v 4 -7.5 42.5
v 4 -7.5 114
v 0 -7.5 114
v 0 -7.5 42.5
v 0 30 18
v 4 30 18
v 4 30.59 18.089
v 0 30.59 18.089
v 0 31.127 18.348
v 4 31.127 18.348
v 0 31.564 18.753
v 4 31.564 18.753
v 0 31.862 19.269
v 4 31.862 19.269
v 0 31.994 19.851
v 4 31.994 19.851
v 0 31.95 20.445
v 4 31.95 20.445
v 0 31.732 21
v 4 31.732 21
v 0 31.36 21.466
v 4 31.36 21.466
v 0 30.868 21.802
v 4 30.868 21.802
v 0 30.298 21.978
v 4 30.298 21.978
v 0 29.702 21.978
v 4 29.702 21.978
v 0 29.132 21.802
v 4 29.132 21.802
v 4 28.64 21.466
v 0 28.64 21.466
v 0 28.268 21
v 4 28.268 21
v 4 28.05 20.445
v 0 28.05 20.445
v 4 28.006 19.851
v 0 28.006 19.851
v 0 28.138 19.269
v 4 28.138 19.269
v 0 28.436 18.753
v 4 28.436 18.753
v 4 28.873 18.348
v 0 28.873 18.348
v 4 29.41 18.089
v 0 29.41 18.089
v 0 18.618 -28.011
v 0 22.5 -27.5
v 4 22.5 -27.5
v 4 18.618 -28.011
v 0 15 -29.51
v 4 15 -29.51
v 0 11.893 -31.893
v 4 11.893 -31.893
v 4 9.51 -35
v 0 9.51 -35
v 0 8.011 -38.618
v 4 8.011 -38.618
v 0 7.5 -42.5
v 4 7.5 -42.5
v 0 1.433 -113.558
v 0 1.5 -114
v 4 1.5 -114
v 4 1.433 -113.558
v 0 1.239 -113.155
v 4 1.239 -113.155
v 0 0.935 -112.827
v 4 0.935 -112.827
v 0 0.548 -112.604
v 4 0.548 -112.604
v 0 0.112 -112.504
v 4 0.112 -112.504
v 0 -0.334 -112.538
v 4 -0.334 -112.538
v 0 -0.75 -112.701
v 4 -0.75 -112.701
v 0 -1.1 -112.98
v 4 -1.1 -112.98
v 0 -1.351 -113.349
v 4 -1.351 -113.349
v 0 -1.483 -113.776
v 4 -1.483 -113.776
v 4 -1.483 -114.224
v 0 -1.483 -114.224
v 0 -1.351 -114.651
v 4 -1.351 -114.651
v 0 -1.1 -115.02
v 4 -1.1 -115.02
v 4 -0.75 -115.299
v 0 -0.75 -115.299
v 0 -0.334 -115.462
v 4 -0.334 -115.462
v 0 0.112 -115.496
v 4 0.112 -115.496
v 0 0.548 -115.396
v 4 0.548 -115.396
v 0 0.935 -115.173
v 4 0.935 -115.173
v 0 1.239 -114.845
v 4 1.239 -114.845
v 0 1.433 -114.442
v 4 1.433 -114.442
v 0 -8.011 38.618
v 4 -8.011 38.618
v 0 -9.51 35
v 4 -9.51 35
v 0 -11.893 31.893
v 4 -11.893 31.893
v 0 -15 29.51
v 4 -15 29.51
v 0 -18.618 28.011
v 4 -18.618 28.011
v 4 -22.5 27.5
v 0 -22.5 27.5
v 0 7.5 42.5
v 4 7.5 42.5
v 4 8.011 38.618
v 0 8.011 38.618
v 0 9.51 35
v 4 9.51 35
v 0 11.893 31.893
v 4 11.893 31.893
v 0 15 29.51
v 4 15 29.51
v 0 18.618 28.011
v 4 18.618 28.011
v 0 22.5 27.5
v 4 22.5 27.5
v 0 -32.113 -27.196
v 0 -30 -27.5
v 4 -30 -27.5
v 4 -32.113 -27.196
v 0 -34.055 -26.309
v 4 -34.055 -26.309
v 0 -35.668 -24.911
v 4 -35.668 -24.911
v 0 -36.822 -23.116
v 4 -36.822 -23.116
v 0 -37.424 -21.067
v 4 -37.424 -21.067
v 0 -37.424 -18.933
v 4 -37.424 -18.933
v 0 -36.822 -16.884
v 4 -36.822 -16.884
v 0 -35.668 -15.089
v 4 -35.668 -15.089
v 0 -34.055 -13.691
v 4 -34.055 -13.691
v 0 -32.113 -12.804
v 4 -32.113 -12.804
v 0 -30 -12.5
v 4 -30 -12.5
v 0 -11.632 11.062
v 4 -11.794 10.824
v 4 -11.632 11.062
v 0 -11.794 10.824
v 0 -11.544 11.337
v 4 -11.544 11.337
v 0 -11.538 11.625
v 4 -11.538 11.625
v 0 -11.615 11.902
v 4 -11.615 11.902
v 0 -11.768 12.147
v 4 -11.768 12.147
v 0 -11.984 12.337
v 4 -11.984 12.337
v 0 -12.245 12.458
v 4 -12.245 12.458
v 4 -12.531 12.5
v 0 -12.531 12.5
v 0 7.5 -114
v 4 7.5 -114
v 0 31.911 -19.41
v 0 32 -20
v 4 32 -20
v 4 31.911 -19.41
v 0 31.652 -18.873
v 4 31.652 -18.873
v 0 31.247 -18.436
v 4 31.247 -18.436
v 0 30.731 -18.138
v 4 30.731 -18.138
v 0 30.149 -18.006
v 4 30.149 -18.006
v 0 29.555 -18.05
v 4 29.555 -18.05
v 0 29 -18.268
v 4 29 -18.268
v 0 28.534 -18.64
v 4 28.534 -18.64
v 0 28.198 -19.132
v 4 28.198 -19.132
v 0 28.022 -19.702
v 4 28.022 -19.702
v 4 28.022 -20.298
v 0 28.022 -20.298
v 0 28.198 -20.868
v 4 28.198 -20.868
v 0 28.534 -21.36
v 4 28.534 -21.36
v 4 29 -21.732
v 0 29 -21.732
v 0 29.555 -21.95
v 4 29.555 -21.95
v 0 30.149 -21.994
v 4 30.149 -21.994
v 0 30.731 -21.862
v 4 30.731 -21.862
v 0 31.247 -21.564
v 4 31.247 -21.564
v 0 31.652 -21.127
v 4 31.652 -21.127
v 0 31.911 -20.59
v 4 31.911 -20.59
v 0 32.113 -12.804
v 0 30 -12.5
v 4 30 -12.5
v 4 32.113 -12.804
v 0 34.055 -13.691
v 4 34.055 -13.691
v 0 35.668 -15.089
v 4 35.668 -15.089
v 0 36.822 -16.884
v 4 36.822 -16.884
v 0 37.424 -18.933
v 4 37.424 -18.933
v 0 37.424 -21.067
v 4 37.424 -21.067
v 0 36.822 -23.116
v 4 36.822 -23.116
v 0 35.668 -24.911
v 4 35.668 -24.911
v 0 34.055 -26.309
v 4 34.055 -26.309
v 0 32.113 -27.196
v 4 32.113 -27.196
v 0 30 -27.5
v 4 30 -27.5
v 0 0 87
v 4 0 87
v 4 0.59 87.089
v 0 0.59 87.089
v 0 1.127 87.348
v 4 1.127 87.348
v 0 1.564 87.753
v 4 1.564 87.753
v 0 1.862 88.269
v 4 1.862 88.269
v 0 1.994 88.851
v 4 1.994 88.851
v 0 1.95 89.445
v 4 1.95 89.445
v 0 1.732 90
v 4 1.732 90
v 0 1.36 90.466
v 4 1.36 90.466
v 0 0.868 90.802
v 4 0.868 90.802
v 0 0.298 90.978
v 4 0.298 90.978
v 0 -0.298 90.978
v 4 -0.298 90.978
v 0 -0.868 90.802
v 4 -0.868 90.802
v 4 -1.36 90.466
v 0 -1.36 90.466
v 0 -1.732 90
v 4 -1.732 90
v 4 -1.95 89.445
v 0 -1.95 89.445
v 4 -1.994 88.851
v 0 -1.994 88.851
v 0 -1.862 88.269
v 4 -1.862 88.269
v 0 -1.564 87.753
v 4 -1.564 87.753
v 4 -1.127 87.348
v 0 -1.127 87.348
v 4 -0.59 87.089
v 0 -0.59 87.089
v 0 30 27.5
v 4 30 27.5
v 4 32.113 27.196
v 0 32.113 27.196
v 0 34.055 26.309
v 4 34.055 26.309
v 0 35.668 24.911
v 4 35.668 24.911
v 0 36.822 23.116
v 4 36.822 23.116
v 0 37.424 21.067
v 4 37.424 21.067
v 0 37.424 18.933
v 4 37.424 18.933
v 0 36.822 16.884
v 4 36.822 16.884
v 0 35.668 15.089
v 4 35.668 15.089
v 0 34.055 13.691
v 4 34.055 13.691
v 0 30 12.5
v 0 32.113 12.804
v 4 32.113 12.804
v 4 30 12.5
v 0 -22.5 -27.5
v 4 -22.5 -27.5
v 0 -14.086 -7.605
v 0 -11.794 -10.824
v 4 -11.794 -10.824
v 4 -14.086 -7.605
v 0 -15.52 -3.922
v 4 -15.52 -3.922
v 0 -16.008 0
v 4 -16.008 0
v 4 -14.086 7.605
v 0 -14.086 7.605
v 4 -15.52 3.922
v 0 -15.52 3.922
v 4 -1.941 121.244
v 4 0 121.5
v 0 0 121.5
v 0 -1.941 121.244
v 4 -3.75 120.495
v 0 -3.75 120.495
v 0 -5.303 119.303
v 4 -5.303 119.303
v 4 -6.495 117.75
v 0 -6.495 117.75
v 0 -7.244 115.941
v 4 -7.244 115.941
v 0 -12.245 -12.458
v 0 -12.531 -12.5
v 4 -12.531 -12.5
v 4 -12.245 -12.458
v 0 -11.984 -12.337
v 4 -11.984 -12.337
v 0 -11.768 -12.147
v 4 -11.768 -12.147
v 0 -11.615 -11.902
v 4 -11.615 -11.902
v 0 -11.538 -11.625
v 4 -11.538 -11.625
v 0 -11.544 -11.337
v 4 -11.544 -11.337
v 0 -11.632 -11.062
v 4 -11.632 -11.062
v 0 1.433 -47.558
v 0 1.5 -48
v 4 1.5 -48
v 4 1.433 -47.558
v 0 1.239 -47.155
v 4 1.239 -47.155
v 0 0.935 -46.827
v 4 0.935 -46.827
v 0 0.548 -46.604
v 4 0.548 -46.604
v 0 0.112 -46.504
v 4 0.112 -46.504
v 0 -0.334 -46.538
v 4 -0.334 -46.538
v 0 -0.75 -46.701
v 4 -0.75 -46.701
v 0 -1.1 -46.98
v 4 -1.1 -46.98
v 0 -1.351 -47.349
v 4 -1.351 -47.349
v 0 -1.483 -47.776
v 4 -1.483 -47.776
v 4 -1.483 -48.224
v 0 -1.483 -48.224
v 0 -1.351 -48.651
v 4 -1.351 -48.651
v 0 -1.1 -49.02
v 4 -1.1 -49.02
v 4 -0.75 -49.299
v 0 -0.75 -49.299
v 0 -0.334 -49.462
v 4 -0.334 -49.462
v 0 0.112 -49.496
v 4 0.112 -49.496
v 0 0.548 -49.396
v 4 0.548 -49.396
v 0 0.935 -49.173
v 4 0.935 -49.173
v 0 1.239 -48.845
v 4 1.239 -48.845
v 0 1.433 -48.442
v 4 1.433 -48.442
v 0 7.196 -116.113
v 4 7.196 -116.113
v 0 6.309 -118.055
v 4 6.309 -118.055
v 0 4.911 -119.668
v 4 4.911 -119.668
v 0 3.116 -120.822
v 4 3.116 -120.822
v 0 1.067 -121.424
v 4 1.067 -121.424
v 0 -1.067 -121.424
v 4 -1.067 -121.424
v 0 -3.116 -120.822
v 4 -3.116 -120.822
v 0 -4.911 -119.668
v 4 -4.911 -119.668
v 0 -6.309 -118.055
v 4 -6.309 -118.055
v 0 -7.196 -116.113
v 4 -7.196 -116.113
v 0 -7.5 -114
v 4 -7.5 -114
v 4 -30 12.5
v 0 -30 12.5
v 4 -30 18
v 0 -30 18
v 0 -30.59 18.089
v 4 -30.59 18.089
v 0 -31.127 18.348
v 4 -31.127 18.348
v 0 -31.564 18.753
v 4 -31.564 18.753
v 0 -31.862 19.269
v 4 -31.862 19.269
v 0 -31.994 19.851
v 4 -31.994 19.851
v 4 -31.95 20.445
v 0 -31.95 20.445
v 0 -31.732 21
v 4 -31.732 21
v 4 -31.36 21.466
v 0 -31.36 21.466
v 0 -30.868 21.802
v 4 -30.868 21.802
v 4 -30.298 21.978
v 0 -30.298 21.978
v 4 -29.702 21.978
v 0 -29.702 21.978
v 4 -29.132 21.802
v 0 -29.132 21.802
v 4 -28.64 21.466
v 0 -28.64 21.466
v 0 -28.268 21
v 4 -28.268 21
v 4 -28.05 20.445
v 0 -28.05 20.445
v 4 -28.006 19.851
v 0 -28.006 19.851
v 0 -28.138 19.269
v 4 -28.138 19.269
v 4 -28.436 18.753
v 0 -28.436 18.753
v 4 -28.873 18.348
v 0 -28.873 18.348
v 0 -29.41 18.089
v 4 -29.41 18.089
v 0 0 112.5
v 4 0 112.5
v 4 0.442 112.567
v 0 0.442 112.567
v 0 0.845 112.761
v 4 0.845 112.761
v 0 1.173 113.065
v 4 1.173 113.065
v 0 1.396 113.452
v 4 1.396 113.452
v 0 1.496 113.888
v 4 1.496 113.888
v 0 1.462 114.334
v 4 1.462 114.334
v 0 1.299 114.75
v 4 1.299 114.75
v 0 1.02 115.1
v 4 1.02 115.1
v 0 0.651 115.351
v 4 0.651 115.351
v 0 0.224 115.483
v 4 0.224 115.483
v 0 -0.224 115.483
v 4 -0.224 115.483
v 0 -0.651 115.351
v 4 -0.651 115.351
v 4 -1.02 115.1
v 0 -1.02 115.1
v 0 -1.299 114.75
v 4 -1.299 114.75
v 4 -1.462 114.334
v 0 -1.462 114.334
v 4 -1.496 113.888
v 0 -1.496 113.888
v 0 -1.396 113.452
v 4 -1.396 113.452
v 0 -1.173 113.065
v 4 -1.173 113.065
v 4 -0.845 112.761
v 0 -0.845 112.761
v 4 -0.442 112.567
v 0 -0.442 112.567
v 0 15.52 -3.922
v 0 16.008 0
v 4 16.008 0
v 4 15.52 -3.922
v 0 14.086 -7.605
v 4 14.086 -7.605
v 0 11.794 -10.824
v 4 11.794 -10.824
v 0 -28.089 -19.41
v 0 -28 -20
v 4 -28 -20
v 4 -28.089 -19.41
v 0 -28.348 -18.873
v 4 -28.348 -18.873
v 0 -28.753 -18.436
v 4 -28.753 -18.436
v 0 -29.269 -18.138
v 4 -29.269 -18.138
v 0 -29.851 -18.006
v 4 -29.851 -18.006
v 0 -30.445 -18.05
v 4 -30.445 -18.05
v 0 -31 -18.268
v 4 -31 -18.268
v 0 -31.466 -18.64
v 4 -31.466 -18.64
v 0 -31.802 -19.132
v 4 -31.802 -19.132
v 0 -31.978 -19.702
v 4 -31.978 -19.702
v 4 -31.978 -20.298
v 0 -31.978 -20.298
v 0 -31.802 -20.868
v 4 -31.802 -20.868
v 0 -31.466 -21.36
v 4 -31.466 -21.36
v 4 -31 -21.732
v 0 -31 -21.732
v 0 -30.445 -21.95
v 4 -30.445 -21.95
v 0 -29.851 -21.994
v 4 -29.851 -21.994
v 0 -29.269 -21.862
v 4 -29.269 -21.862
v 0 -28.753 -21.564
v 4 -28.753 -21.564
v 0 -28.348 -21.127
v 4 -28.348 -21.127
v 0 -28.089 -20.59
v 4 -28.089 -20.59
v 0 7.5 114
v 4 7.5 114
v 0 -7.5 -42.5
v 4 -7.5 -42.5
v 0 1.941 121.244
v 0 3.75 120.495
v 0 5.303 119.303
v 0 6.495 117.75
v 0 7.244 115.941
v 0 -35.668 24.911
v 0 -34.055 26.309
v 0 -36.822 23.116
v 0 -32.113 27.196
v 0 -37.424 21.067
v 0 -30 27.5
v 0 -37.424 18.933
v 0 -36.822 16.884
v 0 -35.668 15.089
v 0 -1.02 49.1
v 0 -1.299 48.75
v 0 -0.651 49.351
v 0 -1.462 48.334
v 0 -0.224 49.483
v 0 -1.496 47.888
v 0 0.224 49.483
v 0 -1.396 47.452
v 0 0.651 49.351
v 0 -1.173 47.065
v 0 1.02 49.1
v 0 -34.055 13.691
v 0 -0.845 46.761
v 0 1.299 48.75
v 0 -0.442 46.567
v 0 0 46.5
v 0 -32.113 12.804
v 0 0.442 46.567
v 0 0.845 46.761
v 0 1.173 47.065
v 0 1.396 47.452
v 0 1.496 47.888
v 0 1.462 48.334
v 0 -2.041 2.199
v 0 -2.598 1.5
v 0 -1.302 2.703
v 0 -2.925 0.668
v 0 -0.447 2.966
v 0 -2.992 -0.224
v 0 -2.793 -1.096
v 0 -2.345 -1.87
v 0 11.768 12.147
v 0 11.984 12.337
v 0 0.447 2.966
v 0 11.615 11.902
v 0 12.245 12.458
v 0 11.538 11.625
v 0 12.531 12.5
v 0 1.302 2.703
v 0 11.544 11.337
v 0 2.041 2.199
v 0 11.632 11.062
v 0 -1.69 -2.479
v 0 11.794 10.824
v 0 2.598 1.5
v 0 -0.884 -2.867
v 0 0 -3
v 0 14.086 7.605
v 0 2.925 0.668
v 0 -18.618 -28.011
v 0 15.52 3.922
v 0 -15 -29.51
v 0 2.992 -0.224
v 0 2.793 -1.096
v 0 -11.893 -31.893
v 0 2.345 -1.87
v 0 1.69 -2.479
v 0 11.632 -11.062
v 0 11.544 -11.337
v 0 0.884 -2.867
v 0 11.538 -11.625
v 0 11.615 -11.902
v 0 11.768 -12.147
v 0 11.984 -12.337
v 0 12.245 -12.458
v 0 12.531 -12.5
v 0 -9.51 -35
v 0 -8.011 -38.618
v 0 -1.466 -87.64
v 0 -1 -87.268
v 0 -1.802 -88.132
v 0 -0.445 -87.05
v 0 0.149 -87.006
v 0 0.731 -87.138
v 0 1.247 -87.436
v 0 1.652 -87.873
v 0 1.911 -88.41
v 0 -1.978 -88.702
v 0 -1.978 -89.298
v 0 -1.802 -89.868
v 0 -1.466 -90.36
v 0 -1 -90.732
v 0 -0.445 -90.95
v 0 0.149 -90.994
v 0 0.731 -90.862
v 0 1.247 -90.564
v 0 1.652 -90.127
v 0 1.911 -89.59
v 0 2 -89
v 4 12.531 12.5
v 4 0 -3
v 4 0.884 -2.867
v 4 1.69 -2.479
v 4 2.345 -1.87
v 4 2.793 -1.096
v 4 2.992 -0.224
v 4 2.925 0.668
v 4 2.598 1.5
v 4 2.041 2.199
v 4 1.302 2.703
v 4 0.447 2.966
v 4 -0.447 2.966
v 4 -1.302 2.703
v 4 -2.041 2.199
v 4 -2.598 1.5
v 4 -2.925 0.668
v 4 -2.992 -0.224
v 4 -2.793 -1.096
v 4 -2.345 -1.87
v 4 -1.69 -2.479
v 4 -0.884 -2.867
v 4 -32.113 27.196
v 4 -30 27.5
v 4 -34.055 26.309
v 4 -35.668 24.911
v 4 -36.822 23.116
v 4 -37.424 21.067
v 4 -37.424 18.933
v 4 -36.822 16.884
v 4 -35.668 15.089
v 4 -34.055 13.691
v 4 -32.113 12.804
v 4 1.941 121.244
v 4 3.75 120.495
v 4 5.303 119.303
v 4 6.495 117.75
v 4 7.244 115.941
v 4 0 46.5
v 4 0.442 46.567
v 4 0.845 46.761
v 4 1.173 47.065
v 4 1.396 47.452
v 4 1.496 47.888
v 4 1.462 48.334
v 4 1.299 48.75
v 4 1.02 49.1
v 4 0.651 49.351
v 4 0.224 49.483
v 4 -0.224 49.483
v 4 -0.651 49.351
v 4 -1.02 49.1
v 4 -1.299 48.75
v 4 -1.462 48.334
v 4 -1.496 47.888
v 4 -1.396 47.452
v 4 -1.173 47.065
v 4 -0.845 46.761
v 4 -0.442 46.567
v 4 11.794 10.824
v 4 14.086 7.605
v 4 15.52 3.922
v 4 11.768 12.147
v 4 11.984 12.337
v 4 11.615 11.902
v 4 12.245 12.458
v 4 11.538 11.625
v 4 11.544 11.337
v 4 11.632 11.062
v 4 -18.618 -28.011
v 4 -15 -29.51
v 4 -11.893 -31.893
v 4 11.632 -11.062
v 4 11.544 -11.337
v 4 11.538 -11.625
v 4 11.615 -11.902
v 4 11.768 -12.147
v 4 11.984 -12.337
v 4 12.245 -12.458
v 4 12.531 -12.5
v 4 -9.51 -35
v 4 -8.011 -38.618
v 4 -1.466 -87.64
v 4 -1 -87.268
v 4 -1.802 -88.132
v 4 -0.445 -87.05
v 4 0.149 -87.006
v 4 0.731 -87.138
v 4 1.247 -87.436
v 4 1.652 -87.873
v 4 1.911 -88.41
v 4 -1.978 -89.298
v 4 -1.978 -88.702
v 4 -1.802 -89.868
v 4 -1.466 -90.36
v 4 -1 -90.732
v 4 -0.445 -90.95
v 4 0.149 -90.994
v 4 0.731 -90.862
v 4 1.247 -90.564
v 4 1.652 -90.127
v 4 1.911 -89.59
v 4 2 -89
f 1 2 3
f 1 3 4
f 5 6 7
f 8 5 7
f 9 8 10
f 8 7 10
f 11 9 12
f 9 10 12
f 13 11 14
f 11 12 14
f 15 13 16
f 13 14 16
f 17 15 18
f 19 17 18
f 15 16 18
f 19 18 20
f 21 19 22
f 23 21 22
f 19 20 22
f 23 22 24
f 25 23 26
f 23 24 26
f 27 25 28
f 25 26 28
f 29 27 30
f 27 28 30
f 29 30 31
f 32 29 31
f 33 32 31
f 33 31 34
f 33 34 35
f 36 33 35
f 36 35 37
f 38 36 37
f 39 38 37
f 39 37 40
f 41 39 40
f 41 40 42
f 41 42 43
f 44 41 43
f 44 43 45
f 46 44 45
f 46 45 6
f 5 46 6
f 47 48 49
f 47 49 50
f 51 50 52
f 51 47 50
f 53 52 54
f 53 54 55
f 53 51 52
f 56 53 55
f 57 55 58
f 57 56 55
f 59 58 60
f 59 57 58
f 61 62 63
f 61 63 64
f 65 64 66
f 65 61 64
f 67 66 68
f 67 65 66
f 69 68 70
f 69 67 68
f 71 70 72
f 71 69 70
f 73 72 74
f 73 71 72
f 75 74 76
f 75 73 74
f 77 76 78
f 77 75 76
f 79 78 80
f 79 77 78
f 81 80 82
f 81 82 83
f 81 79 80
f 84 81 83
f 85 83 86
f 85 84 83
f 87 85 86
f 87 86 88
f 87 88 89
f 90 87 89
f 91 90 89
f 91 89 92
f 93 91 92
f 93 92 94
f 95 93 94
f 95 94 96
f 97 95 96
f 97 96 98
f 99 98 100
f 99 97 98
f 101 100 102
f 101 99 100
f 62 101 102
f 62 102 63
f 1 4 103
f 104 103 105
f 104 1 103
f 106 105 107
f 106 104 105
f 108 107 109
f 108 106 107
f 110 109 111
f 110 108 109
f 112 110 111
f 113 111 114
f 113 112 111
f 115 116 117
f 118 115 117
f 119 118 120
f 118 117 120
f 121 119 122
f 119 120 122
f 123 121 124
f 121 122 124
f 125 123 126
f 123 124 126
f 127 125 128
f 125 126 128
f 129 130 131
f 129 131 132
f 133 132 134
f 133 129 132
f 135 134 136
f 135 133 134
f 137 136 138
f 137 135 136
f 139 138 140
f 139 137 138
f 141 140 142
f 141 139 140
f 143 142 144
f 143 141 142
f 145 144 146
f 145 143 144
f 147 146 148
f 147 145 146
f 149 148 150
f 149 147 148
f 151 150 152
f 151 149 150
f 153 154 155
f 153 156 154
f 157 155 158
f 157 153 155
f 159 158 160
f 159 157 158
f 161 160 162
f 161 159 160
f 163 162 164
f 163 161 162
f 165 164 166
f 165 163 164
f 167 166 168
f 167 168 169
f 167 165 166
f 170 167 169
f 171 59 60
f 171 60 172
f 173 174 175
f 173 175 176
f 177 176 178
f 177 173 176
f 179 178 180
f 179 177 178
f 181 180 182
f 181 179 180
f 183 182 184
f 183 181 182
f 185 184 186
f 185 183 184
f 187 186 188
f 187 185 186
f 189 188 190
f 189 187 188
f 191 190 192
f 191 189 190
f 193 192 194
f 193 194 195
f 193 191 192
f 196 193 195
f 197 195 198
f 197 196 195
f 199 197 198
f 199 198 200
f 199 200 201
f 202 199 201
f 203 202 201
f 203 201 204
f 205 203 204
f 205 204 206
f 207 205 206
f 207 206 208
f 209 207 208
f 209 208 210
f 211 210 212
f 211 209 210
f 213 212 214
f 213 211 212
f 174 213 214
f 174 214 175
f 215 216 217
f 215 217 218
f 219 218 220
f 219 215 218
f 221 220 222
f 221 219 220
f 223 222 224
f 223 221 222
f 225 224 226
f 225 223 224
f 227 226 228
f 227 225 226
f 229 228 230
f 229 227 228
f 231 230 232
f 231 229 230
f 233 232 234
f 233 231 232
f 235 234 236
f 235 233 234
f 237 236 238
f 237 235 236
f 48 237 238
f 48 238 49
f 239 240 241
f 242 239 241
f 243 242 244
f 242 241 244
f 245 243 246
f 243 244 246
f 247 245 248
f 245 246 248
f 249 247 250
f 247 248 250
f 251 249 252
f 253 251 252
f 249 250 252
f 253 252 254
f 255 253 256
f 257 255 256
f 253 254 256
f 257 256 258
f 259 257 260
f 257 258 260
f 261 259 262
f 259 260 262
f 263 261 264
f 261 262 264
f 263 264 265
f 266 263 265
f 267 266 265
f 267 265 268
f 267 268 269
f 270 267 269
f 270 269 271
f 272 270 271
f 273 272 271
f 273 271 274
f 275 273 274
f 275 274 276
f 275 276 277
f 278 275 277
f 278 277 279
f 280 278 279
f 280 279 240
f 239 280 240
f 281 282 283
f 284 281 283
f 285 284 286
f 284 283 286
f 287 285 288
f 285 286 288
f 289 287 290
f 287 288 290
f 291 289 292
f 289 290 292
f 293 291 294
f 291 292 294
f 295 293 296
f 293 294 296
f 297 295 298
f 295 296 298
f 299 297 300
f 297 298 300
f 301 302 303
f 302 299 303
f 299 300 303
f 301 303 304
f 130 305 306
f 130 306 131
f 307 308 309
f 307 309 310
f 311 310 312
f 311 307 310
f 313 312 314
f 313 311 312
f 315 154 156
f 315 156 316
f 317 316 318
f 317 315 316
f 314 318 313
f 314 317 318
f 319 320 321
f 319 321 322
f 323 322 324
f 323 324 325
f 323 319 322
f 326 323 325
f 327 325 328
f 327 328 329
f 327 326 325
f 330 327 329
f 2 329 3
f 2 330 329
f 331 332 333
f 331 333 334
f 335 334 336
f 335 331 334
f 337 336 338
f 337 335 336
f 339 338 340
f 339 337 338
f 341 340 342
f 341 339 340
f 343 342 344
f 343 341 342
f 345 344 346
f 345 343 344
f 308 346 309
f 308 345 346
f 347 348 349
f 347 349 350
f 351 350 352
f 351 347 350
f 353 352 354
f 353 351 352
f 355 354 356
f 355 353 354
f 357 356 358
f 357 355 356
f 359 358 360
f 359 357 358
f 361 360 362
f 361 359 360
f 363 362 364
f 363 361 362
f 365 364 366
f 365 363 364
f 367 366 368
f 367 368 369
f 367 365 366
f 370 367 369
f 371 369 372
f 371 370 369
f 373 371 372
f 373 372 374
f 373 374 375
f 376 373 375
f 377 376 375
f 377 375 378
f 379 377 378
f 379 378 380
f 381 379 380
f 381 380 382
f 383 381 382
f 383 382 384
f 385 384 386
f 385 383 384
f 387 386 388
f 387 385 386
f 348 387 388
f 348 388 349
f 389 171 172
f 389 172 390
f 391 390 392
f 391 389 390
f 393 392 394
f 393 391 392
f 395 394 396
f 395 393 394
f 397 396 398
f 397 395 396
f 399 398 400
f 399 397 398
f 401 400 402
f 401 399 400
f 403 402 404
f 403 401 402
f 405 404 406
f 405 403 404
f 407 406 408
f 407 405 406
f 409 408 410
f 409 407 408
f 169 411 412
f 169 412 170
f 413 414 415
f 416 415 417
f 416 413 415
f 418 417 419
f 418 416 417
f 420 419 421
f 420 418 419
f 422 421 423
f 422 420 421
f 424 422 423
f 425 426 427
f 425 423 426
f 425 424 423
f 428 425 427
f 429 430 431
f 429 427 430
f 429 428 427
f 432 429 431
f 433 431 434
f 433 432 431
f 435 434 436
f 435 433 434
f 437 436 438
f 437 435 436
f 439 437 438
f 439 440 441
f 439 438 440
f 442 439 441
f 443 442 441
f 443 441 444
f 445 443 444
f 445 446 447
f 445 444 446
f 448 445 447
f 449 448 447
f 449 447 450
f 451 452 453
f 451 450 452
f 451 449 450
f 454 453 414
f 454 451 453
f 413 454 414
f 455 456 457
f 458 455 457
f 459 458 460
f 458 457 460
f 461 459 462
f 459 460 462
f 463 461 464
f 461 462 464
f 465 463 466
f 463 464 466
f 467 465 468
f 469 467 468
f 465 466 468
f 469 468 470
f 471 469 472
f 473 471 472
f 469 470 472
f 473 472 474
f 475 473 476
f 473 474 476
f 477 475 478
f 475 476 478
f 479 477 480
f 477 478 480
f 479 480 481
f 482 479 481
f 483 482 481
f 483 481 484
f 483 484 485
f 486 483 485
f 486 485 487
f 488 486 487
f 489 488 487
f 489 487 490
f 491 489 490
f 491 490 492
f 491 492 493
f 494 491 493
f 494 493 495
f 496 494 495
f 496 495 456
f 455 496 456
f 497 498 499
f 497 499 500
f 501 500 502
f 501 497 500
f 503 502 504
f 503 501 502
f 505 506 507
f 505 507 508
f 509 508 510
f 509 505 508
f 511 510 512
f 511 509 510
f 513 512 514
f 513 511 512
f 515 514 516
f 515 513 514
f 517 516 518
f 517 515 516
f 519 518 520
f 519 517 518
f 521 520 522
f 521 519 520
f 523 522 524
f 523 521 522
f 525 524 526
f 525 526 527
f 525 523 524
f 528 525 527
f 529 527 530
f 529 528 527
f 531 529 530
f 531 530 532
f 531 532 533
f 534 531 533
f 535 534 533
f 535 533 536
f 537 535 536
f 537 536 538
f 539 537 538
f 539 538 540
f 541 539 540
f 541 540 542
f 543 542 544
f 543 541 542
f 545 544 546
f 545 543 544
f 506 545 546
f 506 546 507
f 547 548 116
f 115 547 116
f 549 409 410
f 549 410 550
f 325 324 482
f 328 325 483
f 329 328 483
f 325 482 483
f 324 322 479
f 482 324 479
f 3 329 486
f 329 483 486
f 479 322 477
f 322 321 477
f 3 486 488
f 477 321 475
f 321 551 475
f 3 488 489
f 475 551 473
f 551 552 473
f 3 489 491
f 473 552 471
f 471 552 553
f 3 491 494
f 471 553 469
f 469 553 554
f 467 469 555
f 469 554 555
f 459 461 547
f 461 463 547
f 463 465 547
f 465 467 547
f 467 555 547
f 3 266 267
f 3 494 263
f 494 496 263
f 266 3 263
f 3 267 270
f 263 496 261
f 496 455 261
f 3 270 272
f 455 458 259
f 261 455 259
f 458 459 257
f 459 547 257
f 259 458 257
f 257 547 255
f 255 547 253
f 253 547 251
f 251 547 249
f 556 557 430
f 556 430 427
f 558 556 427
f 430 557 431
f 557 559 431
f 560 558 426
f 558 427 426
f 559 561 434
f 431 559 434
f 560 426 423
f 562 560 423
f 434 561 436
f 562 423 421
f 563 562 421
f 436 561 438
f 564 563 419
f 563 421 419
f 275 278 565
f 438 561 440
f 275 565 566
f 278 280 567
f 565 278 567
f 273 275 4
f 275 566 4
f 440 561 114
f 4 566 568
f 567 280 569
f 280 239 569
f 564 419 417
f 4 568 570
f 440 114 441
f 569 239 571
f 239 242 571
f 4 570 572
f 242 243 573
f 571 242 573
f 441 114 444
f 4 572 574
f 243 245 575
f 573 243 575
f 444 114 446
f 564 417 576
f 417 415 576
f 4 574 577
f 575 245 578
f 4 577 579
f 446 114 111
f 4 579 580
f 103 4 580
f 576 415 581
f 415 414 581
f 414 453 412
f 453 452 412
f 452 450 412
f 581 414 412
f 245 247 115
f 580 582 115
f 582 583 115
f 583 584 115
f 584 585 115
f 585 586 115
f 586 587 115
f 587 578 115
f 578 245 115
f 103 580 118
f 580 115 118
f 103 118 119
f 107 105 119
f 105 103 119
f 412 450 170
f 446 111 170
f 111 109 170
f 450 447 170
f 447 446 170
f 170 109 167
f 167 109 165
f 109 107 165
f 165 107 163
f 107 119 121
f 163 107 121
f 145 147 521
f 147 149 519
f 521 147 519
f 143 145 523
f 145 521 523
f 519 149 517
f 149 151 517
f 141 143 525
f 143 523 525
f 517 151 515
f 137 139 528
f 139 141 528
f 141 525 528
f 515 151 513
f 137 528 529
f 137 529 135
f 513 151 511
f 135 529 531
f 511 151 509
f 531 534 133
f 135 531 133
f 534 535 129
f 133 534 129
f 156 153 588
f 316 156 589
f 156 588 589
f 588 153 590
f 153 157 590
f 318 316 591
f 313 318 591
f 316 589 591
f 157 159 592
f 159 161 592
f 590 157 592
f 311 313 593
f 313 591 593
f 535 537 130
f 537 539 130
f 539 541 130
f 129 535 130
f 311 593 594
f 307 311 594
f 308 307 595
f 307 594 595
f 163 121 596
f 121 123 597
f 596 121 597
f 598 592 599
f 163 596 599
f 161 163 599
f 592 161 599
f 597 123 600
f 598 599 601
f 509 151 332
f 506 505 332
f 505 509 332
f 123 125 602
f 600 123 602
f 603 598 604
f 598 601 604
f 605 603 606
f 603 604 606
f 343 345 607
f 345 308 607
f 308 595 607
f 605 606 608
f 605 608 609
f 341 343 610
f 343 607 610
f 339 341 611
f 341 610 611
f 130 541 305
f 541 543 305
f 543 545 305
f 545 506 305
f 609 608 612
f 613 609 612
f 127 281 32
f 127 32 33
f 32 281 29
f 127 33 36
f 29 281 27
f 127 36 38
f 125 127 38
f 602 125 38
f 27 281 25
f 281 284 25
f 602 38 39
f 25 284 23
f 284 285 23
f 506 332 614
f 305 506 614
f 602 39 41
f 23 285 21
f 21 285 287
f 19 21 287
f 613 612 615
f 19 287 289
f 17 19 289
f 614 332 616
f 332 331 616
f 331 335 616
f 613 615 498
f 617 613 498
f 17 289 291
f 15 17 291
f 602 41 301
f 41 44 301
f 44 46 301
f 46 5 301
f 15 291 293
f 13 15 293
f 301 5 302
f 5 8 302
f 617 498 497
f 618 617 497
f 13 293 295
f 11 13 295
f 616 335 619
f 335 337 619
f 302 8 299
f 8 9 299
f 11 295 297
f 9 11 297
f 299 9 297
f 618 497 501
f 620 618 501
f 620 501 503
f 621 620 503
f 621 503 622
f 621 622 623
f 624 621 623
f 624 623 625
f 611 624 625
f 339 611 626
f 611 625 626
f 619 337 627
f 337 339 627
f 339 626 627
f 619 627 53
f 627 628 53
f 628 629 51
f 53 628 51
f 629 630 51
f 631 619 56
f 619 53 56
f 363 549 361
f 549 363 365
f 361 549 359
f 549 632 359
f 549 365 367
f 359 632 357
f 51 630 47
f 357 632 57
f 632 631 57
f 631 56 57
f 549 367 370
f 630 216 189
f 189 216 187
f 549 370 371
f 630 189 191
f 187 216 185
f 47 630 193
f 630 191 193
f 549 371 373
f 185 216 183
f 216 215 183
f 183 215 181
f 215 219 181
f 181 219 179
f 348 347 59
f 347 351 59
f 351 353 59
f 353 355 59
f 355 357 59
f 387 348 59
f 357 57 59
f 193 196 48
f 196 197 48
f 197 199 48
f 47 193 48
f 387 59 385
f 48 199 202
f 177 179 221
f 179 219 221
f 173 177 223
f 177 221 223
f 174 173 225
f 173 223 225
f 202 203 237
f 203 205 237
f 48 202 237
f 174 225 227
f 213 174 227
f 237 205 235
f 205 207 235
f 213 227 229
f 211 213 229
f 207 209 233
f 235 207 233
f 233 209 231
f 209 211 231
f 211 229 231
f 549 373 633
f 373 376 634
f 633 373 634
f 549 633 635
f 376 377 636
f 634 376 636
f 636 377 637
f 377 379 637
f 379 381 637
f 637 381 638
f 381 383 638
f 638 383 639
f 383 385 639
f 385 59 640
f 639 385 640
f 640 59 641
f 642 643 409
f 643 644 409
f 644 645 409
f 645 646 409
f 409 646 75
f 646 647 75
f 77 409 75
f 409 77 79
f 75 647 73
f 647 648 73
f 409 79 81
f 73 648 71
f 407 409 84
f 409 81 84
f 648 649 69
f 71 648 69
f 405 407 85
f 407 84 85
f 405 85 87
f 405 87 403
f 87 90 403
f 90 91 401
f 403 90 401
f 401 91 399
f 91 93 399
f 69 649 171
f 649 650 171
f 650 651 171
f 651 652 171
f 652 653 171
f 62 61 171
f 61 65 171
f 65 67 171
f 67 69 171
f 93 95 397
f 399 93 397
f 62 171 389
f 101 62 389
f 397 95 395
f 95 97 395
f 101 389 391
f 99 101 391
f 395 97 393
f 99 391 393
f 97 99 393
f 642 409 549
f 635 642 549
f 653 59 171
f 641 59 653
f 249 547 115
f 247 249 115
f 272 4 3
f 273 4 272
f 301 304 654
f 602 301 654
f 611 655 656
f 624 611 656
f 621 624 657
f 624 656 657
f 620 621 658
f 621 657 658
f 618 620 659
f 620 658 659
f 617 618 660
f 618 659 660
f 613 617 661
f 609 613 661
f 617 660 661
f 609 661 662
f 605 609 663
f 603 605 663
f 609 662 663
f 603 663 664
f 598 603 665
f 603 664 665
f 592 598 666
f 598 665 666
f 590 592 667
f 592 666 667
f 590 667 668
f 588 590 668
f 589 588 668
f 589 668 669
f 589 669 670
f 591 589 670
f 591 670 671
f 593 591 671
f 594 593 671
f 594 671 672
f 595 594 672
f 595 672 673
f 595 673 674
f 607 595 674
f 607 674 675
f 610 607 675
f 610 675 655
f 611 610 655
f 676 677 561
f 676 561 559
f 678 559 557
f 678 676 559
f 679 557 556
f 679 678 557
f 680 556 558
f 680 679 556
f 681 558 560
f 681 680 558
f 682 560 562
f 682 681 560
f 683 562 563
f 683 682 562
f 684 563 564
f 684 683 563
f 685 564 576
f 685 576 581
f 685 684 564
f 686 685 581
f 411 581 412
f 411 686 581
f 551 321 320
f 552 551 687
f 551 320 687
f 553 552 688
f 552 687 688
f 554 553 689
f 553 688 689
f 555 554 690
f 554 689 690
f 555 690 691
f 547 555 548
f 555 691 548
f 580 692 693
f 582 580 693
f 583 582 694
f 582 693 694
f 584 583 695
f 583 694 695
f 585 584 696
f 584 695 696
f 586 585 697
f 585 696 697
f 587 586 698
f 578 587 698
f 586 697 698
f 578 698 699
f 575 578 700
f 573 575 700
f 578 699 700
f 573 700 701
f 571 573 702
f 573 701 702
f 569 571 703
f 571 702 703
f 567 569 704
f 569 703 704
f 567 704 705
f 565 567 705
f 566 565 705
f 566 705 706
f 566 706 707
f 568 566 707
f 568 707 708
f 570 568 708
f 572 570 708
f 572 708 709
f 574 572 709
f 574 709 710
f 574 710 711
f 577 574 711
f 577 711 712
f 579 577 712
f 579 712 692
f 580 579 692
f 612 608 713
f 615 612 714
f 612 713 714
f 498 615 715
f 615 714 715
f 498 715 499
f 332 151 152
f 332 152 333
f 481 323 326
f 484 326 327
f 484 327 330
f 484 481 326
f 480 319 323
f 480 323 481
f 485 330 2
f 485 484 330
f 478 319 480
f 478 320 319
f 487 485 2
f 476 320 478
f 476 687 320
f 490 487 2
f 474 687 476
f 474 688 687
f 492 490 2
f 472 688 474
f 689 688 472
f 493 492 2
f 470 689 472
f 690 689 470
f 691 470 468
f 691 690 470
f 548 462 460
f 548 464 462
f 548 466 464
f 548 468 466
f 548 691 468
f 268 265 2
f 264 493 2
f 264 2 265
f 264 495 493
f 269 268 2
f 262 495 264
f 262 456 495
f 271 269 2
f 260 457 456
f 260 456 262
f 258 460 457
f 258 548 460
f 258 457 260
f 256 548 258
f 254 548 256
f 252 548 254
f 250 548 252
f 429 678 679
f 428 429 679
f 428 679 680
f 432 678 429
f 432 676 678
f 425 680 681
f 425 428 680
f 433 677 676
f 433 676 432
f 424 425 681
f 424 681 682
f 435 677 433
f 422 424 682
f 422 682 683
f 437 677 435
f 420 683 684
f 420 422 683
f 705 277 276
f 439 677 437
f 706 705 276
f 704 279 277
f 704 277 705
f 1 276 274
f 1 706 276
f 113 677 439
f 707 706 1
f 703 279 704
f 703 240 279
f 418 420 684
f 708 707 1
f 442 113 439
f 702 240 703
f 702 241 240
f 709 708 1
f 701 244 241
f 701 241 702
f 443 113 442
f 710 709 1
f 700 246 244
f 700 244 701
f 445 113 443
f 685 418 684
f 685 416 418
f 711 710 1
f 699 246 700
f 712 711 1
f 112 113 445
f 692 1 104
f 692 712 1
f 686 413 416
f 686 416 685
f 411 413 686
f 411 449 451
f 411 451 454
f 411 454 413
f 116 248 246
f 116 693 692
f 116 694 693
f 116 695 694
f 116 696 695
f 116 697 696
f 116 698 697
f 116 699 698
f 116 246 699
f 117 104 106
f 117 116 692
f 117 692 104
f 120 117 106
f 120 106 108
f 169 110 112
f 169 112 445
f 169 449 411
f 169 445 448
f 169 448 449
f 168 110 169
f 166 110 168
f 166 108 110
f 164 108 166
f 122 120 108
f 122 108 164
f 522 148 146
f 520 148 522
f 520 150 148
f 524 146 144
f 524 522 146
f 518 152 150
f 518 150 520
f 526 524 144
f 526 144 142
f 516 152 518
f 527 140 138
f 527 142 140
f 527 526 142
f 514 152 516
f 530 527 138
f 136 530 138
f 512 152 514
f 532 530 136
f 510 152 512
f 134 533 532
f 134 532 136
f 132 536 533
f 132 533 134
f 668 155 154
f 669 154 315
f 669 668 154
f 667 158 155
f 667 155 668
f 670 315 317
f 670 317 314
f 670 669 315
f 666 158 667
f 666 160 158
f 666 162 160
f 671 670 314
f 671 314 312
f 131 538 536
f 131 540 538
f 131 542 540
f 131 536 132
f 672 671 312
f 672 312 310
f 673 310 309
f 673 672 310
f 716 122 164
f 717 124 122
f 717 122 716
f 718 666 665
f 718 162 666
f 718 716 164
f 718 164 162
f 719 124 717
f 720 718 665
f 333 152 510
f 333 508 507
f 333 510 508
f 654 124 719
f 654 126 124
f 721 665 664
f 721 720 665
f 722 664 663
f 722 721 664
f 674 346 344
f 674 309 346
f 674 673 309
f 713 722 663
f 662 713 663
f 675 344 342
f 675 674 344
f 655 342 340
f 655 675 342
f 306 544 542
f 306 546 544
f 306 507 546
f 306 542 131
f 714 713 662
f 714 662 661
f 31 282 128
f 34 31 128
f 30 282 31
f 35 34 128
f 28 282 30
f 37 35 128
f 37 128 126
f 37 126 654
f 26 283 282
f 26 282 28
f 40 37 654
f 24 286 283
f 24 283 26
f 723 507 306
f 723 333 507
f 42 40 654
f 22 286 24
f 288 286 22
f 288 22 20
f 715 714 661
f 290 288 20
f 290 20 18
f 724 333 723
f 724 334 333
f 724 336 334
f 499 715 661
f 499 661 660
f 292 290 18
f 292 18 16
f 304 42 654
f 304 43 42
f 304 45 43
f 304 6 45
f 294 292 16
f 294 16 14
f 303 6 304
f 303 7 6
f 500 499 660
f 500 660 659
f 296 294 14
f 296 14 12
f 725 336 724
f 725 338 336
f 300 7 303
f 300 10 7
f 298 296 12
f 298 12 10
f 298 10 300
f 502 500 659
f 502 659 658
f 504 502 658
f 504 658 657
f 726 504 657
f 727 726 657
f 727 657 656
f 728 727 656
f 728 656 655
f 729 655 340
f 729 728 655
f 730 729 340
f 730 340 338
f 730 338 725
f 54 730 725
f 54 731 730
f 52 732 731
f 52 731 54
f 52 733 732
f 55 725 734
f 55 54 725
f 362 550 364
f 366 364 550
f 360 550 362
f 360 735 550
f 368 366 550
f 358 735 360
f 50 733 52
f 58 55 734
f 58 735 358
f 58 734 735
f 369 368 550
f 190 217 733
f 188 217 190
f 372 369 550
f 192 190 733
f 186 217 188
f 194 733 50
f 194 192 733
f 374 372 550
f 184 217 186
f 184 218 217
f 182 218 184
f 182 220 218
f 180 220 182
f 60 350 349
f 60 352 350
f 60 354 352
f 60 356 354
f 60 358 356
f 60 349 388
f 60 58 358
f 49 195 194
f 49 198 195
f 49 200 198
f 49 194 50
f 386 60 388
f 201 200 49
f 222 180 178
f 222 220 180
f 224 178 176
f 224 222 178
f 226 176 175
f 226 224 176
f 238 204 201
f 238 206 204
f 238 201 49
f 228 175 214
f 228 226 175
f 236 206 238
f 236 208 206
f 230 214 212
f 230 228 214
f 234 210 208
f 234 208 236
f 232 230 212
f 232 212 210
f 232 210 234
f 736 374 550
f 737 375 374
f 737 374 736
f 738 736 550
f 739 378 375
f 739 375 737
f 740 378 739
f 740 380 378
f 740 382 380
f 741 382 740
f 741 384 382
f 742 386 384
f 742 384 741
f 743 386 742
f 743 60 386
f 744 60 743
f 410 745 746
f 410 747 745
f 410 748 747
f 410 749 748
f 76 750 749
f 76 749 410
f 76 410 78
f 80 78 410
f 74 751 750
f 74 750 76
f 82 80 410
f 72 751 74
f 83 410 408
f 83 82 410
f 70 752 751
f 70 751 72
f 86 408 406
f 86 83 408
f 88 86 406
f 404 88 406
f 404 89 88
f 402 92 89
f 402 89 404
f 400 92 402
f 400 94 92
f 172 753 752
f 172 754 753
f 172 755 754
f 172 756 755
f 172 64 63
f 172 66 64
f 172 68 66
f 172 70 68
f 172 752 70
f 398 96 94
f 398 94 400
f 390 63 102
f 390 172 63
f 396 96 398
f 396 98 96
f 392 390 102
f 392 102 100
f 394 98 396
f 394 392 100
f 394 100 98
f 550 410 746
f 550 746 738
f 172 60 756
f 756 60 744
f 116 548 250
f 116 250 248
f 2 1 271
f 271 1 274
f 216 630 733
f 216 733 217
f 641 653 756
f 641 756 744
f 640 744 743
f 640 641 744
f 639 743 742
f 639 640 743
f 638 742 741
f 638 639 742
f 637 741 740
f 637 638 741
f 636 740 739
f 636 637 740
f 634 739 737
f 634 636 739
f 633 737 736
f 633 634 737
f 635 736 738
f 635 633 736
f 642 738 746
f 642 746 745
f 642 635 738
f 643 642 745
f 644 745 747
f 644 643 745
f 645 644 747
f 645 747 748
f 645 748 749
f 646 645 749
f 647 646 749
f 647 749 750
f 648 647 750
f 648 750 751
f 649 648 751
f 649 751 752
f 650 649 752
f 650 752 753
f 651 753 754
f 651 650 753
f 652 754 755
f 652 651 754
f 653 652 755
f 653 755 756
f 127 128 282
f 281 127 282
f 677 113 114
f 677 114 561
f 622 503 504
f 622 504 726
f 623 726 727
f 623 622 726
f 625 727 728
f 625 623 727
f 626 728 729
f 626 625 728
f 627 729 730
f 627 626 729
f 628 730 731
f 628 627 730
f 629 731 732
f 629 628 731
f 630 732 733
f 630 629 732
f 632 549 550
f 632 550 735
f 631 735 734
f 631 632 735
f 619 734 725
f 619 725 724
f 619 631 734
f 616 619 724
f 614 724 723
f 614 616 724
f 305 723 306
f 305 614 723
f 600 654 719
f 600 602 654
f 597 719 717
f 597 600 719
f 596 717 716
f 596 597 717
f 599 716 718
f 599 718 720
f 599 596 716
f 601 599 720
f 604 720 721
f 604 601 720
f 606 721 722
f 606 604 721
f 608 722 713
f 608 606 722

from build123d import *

# Parameters (mm, degrees)
SKETCH1_W            = 250
SKETCH1_H            = 90
BOSS_EXTRUDE1_DEPTH  = 4
SKETCH2_R            = 3
SKETCH2_R_2          = 1.5
SKETCH2_R_3          = 2
CUT_EXTRUDE1_DEPTH   = 133.91350571
SKETCH3_R            = 2
CUT_EXTRUDE2_DEPTH   = 133.91350571
CUT_EXTRUDE3_DEPTH   = 133.91350571
FILLET1_R            = 1
FILLET1_OF_MIRROR2_R = 1
MIRROR3_OUTLINE_R    = 1.5
MIRROR3_OUTLINE_R_2  = 2
MIRROR3_DEPTH        = 4


# Read off the part's stored shape, not the designer's step: Mirror3
with BuildPart() as part:
    # Sketch1 → Boss-Extrude1 (new body)
    with BuildSketch(Plane(origin=(0, 0, 0), x_dir=(0, 0, -1), z_dir=(1, 0, 0))):
        Rectangle(SKETCH1_W, SKETCH1_H)
    extrude(amount=BOSS_EXTRUDE1_DEPTH)

    # Sketch2 → Cut-Extrude1 (cut, through all)
    with BuildSketch(Plane(origin=(4, 0, 0), x_dir=(0, 0, -1), z_dir=(1, 0, 0))):
        Circle(SKETCH2_R)
        with Locations((-48, 0)):
            Circle(SKETCH2_R_2)
        with Locations((-89, 0)):
            Circle(SKETCH2_R_3)
        with Locations((-114, 0)):
            Circle(SKETCH2_R_2)
    extrude(amount=-CUT_EXTRUDE1_DEPTH, mode=Mode.SUBTRACT)

    # Sketch3 → Cut-Extrude2 (cut, through all)
    with BuildSketch(Plane(origin=(4, 0, 0), x_dir=(0, 0, -1), z_dir=(1, 0, 0))):
        with Locations((-20, 30)):
            Circle(SKETCH3_R)
    cut_extrude2 = extrude(amount=-CUT_EXTRUDE2_DEPTH, mode=Mode.SUBTRACT)

    # Sketch4 → Cut-Extrude3 (cut, through all)
    with BuildSketch(Plane(origin=(4, 0, 0), x_dir=(0, 0, -1), z_dir=(1, 0, 0))):
        with BuildLine():
            Line((-114, 7.5), (-50, 7.5))
            Line((-50, 7.5), (-42.5, 7.5))
            ThreePointArc((-42.5, 7.5), (-31.893398282, 11.893398282), (-27.5, 22.5))
            Line((-27.5, 22.5), (-27.5, 30))
            ThreePointArc((-27.5, 30), (-20, 37.5), (-12.5, 30))
            Line((-12.5, 30), (-12.5, 10))
            ThreePointArc((-12.5, 10), (-6.934403149, 14.427891494), (0, 16.007810594))
            Line((0, 16.007810594), (0, 45))
            Line((0, 45), (-125, 45))
            Line((-125, 45), (-125, 1.99556796))
            Line((-125, 1.99556796), (-125, 0))
            Line((-125, 0), (-121.5, 0))
            ThreePointArc((-121.5, 0), (-119.303300859, 5.303300859), (-114, 7.5))
        make_face()
    cut_extrude3 = extrude(amount=-CUT_EXTRUDE3_DEPTH, mode=Mode.SUBTRACT)

    # Fillet1
    fillet1_edges = [part.edges().sort_by_distance(p)[0] for p in [
        (2, 10, 12.5),
    ]]
    fillet(fillet1_edges, radius=FILLET1_R)

    # Mirror2: Cut-Extrude2, Cut-Extrude3 across plane
    add(cut_extrude2.mirror(Plane.ZX), mode=Mode.SUBTRACT)
    add(cut_extrude3.mirror(Plane.ZX), mode=Mode.SUBTRACT)

    # Fillet1 of Mirror2
    fillet1_of_mirror2_edges = [part.edges().sort_by_distance(p)[0] for p in [
        (2, -10, 12.5),
    ]]
    fillet(fillet1_of_mirror2_edges, radius=FILLET1_OF_MIRROR2_R)

    # Mirror3 outline → Mirror3 (cut)
    with BuildSketch(Plane.YZ):
        with BuildLine():
            Line((7.5, -42.5), (7.5, -114))
            ThreePointArc((7.5, -114), (0, -121.5), (-7.5, -114))
            Line((-7.5, -114), (-7.5, -42.5))
            ThreePointArc((-7.5, -42.5), (-11.893398282, -31.893398282), (-22.5, -27.5))
            Line((-22.5, -27.5), (-30, -27.5))
            ThreePointArc((-30, -27.5), (-37.5, -20), (-30, -12.5))
            Line((-30, -12.5), (-12.530587424, -12.5))
            ThreePointArc((-12.530587424, -12.5), (-11.615120349, -11.902392887), (-11.793832546, -10.823840071))
            ThreePointArc((-11.793832546, -10.823840071), (-14.917161888, -5.807605463), (-16.007810594, 0))
            Line((-16.007810594, 0), (-45, 0))
            Line((-45, 0), (-45, -125))
            Line((-45, -125), (45, -125))
            Line((45, -125), (45, 0))
            Line((45, 0), (16.007810594, 0))
            ThreePointArc((16.007810594, 0), (14.917161888, -5.807605463), (11.793832546, -10.823840071))
            ThreePointArc((11.793832546, -10.823840071), (11.615120349, -11.902392887), (12.530587424, -12.5))
            Line((12.530587424, -12.5), (30, -12.5))
            ThreePointArc((30, -12.5), (37.5, -20), (30, -27.5))
            Line((30, -27.5), (22.5, -27.5))
            ThreePointArc((22.5, -27.5), (11.893398282, -31.893398282), (7.5, -42.5))
        make_face()
        with Locations((0, -114)):
            Circle(MIRROR3_OUTLINE_R)
        with Locations((0, -89)):
            Circle(MIRROR3_OUTLINE_R_2)
        with Locations((0, -48)):
            Circle(MIRROR3_OUTLINE_R)
        with Locations((30, -20)):
            Circle(MIRROR3_OUTLINE_R_2)
        with Locations((-30, -20)):
            Circle(MIRROR3_OUTLINE_R_2)
    extrude(amount=MIRROR3_DEPTH, mode=Mode.SUBTRACT)


solid = part.part
